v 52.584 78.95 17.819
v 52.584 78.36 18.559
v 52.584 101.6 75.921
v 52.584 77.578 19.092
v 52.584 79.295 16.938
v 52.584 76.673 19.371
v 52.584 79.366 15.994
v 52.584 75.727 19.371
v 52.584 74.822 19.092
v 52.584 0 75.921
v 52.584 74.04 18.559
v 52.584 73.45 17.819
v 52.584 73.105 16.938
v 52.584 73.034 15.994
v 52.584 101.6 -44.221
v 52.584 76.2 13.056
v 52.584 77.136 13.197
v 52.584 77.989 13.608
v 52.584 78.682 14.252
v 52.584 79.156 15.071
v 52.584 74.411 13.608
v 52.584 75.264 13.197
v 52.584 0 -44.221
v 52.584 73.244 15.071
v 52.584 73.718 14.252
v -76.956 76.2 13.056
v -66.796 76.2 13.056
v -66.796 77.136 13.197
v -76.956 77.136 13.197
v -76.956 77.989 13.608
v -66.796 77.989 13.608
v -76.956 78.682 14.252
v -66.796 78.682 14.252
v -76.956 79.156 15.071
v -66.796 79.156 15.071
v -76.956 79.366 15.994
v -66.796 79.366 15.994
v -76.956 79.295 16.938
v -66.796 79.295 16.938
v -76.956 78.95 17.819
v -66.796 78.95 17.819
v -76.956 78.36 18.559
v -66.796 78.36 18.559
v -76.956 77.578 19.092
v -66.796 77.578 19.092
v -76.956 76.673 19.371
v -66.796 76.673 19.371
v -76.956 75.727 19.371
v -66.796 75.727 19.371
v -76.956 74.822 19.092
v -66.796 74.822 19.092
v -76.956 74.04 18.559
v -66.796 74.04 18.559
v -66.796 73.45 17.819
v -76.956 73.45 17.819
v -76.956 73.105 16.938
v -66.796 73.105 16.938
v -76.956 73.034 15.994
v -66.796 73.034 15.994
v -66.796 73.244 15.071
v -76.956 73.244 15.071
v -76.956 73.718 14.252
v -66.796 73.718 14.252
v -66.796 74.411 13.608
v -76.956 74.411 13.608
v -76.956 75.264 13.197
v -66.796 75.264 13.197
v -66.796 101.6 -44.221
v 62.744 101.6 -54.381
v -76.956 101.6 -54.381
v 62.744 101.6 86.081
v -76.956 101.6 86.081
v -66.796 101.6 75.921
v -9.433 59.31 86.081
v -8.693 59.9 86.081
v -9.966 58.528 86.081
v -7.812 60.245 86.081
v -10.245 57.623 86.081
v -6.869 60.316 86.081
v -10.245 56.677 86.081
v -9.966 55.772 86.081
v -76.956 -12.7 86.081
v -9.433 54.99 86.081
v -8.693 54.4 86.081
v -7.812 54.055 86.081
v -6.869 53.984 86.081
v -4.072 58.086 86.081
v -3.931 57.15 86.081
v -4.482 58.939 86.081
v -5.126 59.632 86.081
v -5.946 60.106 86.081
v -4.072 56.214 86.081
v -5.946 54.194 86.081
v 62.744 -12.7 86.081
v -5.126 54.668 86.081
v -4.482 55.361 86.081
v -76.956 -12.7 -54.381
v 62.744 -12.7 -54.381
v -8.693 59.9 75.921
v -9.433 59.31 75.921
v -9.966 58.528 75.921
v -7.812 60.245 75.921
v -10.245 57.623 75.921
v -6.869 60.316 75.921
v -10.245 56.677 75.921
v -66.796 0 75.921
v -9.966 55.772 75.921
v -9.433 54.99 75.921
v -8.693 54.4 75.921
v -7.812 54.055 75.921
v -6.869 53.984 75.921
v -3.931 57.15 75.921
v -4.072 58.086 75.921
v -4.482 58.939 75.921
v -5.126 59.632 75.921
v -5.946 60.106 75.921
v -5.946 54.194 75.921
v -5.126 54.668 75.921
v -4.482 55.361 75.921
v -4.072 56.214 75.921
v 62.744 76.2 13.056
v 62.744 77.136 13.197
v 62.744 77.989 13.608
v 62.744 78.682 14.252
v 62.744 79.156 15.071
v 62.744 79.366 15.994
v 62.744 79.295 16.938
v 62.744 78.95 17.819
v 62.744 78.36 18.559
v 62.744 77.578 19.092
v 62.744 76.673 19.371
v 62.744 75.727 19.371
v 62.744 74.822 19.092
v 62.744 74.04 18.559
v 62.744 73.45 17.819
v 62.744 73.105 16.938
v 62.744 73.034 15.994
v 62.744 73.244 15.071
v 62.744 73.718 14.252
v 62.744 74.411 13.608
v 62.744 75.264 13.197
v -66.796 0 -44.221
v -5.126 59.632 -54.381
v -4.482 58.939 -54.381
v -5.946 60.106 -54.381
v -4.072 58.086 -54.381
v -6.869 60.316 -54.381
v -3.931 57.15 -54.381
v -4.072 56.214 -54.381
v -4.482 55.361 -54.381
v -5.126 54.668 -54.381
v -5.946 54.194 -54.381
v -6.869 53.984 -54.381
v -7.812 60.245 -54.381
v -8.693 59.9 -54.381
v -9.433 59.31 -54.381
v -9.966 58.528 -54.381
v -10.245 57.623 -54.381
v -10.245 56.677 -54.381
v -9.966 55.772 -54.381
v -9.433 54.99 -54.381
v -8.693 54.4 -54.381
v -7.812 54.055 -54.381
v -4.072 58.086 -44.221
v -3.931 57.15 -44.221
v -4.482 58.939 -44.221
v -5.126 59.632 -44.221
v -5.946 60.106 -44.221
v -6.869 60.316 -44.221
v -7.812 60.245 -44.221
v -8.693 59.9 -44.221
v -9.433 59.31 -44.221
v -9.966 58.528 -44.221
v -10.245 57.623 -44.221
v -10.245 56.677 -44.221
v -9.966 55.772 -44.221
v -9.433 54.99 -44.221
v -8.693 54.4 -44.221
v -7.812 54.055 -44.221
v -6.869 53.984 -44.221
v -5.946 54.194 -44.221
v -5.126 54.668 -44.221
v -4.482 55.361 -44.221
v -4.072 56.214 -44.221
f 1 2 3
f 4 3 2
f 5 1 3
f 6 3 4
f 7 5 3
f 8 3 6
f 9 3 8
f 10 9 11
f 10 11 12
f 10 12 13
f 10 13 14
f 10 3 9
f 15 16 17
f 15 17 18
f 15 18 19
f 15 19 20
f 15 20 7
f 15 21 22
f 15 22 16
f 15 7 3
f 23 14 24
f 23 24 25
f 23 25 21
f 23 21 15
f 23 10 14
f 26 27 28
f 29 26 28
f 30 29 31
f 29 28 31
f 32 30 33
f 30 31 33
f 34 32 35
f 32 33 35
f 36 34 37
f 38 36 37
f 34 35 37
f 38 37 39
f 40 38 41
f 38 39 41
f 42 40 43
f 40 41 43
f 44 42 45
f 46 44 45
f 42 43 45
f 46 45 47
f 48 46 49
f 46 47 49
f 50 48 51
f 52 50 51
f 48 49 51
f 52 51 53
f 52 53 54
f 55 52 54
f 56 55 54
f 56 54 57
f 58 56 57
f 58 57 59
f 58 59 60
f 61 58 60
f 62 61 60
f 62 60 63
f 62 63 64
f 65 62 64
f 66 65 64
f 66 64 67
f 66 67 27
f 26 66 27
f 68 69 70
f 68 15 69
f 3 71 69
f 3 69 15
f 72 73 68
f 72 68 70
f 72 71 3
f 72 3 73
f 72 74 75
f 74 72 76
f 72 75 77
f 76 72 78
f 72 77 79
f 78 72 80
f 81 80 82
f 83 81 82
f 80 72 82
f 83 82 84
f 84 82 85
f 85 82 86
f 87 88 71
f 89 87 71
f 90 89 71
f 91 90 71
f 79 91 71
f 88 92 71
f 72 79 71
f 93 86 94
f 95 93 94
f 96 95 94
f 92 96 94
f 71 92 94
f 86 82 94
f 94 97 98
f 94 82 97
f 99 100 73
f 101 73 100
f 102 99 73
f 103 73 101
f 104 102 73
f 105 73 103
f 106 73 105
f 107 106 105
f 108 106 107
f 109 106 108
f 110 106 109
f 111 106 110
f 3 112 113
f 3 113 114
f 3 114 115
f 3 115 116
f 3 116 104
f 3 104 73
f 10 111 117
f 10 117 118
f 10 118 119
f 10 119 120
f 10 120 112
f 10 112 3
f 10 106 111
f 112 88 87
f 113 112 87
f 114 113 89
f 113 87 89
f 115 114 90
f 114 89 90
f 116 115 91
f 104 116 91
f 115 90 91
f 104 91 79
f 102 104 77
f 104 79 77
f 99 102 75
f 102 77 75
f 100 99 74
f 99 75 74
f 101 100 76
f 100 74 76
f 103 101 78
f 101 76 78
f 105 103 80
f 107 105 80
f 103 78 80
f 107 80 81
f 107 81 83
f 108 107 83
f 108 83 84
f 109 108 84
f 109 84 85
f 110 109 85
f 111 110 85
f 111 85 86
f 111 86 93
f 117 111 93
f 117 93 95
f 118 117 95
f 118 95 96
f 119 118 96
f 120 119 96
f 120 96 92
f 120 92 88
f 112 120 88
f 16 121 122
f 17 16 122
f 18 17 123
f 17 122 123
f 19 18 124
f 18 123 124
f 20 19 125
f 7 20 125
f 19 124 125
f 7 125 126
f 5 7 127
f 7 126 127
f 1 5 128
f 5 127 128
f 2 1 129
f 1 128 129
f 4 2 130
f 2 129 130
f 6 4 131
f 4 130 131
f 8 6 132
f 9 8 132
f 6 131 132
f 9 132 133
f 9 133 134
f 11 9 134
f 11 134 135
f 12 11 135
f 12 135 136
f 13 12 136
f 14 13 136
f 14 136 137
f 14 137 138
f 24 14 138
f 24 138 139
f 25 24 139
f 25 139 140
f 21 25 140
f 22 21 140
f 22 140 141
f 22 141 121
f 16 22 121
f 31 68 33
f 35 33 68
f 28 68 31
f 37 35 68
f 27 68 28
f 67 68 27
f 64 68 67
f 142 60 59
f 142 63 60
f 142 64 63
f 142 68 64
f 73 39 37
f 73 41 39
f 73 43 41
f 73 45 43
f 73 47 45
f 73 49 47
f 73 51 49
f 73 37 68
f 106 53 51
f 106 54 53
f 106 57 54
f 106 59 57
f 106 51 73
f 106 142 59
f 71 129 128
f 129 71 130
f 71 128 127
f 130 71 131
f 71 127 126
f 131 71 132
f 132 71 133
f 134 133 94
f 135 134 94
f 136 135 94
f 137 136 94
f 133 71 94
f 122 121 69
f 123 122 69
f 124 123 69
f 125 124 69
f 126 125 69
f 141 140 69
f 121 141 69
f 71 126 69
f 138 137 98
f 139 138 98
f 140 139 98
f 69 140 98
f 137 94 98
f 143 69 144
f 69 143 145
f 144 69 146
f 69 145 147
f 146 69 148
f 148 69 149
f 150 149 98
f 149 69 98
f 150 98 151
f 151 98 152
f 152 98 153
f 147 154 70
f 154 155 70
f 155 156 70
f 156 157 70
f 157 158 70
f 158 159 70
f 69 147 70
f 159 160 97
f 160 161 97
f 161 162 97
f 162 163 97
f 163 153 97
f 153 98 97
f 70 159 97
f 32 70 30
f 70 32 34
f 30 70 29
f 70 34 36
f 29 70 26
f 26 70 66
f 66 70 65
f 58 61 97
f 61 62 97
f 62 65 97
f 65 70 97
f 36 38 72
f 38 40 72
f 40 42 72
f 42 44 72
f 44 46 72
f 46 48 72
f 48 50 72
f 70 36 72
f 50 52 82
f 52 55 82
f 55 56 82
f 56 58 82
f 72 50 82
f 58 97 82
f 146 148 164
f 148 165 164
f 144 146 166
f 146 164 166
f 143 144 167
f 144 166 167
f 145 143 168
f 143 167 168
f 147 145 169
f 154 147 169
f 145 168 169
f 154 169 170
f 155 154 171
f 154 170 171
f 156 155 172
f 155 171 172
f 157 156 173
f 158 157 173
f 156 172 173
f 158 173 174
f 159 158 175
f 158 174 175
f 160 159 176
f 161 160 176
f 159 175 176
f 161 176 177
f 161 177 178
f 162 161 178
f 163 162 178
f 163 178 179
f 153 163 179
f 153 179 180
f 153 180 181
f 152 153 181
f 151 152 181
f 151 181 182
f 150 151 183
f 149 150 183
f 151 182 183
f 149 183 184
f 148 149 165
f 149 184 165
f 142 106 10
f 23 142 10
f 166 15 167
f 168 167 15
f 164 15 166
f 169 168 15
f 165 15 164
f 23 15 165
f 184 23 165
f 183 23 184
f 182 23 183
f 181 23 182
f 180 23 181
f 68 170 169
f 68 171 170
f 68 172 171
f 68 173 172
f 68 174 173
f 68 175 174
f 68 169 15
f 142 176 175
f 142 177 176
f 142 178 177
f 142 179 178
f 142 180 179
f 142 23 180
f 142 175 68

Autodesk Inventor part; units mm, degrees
ref_plane "YZ Plane" through (0, 0, 0) normal (1, 0, 0) x (0, 1, 0)
ref_plane "XZ Plane" through (0, 0, 0) normal (0, 1, 0) x (-1, 0, 0)
ref_plane "XY Plane" through (0, 0, 0) normal (0, 0, 1) x (1, 0, 0)
sketch "Sketch1" plane through (0, 0, 0) normal (0, 1, 0) x (-1, 0, 0)
  line L0 (66.7958, 75.9213) -> (-52.5842, 75.9213)
  line L1 (-52.5842, 75.9213) -> (-52.5842, -44.2207)
  line L2 (-52.5842, -44.2207) -> (66.7958, -44.2207)
  line L3 (66.7958, -44.2207) -> (66.7958, 75.9213)
  line L4 (76.9558, 86.0813) -> (-62.7442, 86.0813)
  line L5 (-62.7442, 86.0813) -> (-62.7442, -54.3807)
  line L6 (-62.7442, -54.3807) -> (76.9558, -54.3807)
  line L7 (76.9558, -54.3807) -> (76.9558, 86.0813)
  point P0 (0, 0)
  dimension "d0" = 119.38
  dimension "d1" = 120.142
  dimension "d2" = 10.16
  dimension "d3" = 10.16
  dimension "d4" = 10.16
  dimension "d5" = 10.16
extrude "Extrusion1" add sketch "Sketch1" along normal blind 101.6
sketch "Sketch2" plane through (0, 0, 0) normal (0, -1, 0) x (1, 0, 0)
  line L0 (-76.9558, 86.0813) -> (62.7442, 86.0813) projected
  line L1 (-76.9558, -54.3807) -> (-76.9558, 86.0813) projected
  line L2 (62.7442, 86.0813) -> (-76.9558, 86.0813)
  line L3 (-76.9558, 86.0813) -> (-76.9558, -54.3807)
  line L4 (-76.9558, -54.3807) -> (62.7442, -54.3807)
  line L5 (62.7442, -54.3807) -> (62.7442, 86.0813)
  point P0 (0, 0)
extrude "Extrusion2" add sketch "Sketch2" along normal blind 12.7
sketch "Sketch3" plane through (62.7442, 101.6, 86.0813) normal (1, 0, 0) x (0, 0, -1)
  circle A0 centre (69.85, -25.4) radius 3.175
  line L0 (0, 0) -> (140.462, 0) projected
  line L1 (0, -114.3) -> (0, 0) projected
  point P0 (86.0813, -101.6)
  dimension "d10" = 6.35
  dimension "d11" = 25.4
  dimension "d12" = 69.85
extrude "Extrusion3" cut sketch "Sketch3" against normal blind 177.8
sketch "Sketch4" plane through (-76.9558, 101.6, 86.0813) normal (0, 0, 1) x (1, 0, 0)
  circle A0 centre (69.85, -44.45) radius 3.175
  line L0 (0, 0) -> (139.7, 0) projected
  line L1 (0, 0) -> (0, -114.3) projected
  point P0 (76.9558, -101.6)
  dimension "d15" = 6.35
  dimension "d16" = 44.45
  dimension "d17" = 69.85
extrude "Extrusion4" cut sketch "Sketch4" against normal blind 177.8
properties part number "Box" material "Wood (Cherry)"
